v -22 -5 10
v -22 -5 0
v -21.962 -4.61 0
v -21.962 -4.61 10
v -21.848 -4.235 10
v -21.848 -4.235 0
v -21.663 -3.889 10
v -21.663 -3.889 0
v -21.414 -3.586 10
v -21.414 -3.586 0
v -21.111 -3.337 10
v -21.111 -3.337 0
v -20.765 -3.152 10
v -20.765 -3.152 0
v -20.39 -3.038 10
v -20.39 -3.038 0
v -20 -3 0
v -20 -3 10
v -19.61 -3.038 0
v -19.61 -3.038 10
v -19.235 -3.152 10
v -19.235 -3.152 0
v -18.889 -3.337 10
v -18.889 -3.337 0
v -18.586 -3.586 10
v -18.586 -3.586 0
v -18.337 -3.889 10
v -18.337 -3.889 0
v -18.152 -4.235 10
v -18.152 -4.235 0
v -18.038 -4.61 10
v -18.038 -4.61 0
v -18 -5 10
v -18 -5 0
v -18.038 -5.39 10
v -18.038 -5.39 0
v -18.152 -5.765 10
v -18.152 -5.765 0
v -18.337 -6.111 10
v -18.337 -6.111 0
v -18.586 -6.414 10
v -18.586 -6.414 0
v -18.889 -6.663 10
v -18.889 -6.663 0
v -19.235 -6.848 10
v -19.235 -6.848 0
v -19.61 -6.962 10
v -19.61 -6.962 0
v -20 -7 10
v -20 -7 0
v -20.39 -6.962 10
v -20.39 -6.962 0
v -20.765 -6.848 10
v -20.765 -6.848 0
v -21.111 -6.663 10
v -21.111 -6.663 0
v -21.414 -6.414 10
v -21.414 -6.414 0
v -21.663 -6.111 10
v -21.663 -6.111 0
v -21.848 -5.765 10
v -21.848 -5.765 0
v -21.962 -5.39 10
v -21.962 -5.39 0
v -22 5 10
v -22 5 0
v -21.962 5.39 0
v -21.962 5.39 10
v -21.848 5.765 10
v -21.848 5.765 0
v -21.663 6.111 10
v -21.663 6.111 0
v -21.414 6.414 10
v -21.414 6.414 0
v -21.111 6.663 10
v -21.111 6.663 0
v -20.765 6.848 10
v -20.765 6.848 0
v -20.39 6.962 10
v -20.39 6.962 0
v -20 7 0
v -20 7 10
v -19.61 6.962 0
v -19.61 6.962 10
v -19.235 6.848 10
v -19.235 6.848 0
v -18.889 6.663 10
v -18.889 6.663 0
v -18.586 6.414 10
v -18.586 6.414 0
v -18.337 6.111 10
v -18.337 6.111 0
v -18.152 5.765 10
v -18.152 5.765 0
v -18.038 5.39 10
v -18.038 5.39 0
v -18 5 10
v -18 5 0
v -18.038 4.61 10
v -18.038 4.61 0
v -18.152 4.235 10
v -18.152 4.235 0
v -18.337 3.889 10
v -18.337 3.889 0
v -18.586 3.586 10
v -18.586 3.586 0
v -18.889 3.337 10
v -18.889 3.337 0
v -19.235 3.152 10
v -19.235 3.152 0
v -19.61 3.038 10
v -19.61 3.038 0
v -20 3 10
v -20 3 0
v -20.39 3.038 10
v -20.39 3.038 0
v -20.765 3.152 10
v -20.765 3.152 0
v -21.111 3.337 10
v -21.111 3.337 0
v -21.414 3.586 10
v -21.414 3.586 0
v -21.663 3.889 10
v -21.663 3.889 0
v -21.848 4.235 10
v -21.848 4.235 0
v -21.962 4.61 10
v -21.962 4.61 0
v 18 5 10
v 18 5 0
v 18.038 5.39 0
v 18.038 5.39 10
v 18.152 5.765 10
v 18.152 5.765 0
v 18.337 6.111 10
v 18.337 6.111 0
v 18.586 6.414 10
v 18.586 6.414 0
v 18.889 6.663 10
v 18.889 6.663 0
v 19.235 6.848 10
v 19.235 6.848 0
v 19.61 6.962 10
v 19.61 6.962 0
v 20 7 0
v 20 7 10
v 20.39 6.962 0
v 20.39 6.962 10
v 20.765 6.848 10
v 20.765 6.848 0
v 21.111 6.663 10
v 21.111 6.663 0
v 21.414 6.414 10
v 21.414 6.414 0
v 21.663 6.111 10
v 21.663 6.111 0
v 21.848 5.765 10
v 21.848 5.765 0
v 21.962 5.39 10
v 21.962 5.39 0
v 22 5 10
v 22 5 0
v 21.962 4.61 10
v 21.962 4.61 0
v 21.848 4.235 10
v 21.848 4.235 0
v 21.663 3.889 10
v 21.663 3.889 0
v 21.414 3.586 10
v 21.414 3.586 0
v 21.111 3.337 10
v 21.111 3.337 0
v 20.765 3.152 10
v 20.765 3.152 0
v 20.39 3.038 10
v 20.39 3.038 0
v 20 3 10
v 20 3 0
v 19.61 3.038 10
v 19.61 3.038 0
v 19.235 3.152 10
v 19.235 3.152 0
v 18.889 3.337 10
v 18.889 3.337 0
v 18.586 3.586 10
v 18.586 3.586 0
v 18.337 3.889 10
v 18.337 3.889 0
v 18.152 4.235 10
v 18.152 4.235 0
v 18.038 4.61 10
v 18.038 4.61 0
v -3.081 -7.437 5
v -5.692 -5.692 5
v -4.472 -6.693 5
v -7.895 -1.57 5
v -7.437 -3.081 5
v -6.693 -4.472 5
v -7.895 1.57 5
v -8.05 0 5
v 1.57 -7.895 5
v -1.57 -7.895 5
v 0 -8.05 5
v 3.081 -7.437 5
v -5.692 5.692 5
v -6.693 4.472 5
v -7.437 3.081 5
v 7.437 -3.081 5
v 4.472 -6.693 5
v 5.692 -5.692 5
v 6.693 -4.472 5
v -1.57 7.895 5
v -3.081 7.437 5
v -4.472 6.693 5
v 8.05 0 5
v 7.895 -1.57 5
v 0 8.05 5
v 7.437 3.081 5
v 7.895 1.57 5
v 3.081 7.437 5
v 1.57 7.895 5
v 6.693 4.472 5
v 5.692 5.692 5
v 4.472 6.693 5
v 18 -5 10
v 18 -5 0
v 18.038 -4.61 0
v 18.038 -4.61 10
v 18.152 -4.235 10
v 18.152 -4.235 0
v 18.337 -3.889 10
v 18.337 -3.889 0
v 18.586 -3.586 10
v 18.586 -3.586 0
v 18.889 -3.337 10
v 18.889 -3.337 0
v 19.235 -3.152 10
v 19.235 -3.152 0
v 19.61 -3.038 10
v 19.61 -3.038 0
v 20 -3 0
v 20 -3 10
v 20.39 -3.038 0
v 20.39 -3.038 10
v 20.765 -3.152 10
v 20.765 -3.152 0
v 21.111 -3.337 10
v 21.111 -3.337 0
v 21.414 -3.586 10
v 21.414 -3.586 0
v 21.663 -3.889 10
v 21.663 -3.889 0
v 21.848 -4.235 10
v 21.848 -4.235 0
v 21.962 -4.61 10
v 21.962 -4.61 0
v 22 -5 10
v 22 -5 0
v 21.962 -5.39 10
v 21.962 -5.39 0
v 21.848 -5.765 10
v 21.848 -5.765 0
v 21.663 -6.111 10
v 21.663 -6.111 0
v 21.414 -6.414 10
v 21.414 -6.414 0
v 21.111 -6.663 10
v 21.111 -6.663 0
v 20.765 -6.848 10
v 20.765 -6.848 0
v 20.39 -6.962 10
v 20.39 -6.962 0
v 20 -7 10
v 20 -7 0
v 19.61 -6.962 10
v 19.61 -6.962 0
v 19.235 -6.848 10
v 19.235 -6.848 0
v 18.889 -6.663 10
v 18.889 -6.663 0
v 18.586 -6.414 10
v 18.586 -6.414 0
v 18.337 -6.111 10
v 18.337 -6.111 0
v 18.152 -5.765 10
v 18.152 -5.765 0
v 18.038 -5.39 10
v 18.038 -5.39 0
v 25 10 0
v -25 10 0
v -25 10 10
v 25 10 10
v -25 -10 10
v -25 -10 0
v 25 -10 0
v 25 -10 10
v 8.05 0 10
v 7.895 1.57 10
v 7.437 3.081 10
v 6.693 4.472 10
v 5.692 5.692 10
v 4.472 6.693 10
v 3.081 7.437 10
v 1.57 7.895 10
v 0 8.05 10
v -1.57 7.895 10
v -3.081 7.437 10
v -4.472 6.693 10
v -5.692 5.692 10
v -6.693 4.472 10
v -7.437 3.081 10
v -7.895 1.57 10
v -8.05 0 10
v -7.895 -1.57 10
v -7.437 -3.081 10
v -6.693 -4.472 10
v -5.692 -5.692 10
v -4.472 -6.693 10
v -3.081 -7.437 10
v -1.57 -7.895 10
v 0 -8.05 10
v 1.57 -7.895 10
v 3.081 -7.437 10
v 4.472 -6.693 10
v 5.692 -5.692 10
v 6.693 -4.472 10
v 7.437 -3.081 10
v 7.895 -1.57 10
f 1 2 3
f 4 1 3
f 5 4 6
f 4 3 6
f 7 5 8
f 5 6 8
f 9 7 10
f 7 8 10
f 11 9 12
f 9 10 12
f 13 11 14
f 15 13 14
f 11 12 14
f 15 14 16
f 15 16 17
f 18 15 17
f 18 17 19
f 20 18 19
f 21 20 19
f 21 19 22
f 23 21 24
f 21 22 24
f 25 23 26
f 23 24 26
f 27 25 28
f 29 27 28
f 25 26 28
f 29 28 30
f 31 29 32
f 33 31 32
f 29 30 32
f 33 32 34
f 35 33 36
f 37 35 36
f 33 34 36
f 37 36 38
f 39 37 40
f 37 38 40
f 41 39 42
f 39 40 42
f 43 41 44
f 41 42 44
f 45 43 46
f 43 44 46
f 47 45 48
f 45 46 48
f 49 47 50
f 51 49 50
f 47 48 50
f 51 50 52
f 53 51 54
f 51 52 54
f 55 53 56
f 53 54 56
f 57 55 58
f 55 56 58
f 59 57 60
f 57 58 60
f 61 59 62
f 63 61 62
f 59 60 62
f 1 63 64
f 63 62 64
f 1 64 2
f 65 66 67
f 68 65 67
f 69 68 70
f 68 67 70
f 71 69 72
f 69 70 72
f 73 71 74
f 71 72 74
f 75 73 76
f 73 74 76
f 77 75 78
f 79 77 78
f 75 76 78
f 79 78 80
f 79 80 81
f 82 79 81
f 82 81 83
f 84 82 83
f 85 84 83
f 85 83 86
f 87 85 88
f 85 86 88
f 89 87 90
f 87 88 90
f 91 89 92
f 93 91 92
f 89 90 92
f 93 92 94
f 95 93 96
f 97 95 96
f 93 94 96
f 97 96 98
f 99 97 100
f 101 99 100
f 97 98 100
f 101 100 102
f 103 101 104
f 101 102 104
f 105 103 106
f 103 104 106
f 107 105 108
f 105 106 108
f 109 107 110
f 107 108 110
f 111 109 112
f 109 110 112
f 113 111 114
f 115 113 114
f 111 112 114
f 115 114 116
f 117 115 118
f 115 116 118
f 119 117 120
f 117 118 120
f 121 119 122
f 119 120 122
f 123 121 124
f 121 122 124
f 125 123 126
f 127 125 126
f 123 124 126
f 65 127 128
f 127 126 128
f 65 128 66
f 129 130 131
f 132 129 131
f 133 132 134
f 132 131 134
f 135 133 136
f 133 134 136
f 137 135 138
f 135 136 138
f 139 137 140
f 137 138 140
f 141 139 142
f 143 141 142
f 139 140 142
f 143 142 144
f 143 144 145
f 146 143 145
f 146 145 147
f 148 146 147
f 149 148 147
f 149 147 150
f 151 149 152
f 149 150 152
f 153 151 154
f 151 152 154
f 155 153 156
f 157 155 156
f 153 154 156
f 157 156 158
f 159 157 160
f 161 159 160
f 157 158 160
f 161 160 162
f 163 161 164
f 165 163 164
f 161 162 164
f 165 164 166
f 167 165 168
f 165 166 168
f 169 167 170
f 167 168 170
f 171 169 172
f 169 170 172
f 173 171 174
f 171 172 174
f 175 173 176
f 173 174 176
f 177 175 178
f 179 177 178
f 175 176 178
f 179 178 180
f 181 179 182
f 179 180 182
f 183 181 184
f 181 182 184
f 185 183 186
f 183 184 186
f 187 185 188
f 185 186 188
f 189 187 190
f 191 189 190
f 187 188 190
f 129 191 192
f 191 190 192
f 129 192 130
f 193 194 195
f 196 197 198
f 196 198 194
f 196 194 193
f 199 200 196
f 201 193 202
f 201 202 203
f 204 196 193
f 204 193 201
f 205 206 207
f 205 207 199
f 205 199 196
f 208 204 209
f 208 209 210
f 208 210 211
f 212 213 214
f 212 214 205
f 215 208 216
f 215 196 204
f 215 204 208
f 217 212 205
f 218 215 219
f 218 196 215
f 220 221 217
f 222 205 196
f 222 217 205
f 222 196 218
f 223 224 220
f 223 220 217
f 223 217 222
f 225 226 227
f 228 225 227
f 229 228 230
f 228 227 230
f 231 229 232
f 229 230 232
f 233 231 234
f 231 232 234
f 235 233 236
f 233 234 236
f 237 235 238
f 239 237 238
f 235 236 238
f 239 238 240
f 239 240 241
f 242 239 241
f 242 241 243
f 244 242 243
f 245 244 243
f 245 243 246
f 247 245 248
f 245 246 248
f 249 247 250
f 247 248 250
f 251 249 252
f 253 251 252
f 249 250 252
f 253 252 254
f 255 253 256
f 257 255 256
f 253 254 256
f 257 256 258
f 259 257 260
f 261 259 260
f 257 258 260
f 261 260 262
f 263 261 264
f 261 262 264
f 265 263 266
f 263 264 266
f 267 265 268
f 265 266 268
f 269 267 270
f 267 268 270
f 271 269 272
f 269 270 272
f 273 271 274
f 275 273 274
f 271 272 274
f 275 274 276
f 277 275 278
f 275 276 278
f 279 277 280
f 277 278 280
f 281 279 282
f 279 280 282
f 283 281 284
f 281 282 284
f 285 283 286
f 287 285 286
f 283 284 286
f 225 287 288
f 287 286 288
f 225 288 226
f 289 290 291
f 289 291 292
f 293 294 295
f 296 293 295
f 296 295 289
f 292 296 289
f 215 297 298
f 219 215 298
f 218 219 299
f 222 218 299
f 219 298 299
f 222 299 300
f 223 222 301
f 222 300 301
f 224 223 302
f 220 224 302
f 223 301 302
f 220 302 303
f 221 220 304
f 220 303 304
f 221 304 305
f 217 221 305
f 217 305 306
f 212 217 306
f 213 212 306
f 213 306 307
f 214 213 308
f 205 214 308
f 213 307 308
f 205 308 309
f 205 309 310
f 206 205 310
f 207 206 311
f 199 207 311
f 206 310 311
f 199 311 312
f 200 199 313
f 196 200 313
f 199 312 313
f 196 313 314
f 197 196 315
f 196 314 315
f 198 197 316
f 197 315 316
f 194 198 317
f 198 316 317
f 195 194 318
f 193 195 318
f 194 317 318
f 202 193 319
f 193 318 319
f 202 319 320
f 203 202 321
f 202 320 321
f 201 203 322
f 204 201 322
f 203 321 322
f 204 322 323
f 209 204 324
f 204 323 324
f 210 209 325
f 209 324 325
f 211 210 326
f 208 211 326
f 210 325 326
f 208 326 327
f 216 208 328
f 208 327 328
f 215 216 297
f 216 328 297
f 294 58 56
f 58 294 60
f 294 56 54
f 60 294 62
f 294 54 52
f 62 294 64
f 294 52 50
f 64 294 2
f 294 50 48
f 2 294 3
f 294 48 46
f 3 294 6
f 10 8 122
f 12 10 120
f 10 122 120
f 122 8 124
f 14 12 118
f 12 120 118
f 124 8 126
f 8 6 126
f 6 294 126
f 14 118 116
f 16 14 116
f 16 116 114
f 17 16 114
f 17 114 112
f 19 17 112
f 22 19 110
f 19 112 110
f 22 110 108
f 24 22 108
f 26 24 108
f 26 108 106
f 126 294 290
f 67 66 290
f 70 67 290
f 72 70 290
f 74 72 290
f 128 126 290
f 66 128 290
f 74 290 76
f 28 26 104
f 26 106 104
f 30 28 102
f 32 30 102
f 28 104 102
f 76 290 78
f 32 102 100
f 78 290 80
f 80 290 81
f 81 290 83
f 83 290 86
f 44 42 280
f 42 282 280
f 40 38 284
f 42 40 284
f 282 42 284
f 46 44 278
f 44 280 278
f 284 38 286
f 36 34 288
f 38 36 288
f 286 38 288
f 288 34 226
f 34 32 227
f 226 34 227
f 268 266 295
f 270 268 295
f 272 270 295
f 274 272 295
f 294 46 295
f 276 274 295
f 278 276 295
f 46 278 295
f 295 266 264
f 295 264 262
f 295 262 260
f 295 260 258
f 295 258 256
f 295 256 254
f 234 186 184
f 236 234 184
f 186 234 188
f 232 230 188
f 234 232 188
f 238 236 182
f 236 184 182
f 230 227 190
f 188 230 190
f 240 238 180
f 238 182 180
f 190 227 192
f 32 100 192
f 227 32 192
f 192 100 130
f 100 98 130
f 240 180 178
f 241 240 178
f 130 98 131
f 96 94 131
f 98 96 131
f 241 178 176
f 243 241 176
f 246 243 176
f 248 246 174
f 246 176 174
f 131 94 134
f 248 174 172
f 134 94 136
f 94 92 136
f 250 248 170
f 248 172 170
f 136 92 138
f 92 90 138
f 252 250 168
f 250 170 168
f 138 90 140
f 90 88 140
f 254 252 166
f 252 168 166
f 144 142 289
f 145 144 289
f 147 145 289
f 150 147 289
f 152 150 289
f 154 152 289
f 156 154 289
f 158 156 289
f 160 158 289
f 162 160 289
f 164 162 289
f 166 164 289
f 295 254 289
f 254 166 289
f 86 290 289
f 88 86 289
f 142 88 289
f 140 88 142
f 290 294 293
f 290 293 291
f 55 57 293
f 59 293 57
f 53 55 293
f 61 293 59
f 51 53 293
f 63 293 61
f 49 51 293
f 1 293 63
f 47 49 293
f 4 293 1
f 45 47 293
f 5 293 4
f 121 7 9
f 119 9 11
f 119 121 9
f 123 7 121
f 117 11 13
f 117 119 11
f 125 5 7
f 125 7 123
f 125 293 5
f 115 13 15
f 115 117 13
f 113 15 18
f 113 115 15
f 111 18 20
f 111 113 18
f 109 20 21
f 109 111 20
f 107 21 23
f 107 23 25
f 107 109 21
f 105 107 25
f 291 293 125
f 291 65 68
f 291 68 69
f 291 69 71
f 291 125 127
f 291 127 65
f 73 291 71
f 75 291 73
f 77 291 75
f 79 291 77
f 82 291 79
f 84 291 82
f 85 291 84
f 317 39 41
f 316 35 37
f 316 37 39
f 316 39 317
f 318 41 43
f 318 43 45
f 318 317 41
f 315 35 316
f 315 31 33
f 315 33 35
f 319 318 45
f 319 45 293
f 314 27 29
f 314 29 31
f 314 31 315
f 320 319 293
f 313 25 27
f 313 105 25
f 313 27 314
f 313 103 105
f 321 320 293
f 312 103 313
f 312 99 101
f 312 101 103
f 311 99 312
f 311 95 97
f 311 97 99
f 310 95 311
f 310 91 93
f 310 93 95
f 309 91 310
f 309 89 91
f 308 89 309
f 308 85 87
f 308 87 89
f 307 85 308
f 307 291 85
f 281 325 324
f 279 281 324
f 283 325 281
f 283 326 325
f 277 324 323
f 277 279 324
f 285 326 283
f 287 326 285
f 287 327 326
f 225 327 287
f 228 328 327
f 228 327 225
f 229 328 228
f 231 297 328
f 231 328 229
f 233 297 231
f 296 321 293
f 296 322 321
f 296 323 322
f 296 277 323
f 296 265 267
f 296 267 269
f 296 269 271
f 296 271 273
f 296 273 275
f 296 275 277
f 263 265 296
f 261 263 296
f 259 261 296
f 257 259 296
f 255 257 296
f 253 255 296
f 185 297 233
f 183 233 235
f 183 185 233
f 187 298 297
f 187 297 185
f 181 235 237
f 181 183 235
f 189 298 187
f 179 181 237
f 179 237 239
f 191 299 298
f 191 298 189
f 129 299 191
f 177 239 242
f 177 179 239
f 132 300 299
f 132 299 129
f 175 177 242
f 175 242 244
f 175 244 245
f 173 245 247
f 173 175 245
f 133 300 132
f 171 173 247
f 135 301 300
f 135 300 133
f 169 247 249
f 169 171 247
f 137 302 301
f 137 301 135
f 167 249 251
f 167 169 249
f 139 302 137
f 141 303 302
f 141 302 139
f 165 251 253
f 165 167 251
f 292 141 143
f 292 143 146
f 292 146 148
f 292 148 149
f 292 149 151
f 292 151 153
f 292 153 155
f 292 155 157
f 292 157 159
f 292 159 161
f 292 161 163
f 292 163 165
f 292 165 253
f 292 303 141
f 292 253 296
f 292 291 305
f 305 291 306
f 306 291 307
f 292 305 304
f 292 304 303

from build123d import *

# Parameters (mm, degrees)
SKETCH1_W           = 50
SKETCH1_H           = 20
BOSS_EXTRUDE1_DEPTH = 10
SKETCH3_R           = 8.05
CUT_EXTRUDE1_DEPTH  = 5
SKETCH5_R           = 2
CUT_EXTRUDE2_DEPTH  = 10


with BuildPart() as part:
    # Sketch1 → Boss-Extrude1 (new body)
    with BuildSketch(Plane.XY):
        Rectangle(SKETCH1_W, SKETCH1_H)
    extrude(amount=BOSS_EXTRUDE1_DEPTH)

    # Sketch3 → Cut-Extrude1 (cut)
    with BuildSketch(Plane.XY.offset(10)):
        Circle(SKETCH3_R)
    extrude(amount=-CUT_EXTRUDE1_DEPTH, mode=Mode.SUBTRACT)

    # Sketch5 → Cut-Extrude2 (cut)
    with BuildSketch(Plane(origin=(0, 0, 0), x_dir=(-1, 0, 0), z_dir=(0, 0, -1))):
        with Locations((-20, 5)):
            Circle(SKETCH5_R)
        with Locations((-20, -5)):
            Circle(SKETCH5_R)
        with Locations((20, 5)):
            Circle(SKETCH5_R)
        with Locations((20, -5)):
            Circle(SKETCH5_R)
    extrude(amount=-CUT_EXTRUDE2_DEPTH, mode=Mode.SUBTRACT)


solid = part.part
